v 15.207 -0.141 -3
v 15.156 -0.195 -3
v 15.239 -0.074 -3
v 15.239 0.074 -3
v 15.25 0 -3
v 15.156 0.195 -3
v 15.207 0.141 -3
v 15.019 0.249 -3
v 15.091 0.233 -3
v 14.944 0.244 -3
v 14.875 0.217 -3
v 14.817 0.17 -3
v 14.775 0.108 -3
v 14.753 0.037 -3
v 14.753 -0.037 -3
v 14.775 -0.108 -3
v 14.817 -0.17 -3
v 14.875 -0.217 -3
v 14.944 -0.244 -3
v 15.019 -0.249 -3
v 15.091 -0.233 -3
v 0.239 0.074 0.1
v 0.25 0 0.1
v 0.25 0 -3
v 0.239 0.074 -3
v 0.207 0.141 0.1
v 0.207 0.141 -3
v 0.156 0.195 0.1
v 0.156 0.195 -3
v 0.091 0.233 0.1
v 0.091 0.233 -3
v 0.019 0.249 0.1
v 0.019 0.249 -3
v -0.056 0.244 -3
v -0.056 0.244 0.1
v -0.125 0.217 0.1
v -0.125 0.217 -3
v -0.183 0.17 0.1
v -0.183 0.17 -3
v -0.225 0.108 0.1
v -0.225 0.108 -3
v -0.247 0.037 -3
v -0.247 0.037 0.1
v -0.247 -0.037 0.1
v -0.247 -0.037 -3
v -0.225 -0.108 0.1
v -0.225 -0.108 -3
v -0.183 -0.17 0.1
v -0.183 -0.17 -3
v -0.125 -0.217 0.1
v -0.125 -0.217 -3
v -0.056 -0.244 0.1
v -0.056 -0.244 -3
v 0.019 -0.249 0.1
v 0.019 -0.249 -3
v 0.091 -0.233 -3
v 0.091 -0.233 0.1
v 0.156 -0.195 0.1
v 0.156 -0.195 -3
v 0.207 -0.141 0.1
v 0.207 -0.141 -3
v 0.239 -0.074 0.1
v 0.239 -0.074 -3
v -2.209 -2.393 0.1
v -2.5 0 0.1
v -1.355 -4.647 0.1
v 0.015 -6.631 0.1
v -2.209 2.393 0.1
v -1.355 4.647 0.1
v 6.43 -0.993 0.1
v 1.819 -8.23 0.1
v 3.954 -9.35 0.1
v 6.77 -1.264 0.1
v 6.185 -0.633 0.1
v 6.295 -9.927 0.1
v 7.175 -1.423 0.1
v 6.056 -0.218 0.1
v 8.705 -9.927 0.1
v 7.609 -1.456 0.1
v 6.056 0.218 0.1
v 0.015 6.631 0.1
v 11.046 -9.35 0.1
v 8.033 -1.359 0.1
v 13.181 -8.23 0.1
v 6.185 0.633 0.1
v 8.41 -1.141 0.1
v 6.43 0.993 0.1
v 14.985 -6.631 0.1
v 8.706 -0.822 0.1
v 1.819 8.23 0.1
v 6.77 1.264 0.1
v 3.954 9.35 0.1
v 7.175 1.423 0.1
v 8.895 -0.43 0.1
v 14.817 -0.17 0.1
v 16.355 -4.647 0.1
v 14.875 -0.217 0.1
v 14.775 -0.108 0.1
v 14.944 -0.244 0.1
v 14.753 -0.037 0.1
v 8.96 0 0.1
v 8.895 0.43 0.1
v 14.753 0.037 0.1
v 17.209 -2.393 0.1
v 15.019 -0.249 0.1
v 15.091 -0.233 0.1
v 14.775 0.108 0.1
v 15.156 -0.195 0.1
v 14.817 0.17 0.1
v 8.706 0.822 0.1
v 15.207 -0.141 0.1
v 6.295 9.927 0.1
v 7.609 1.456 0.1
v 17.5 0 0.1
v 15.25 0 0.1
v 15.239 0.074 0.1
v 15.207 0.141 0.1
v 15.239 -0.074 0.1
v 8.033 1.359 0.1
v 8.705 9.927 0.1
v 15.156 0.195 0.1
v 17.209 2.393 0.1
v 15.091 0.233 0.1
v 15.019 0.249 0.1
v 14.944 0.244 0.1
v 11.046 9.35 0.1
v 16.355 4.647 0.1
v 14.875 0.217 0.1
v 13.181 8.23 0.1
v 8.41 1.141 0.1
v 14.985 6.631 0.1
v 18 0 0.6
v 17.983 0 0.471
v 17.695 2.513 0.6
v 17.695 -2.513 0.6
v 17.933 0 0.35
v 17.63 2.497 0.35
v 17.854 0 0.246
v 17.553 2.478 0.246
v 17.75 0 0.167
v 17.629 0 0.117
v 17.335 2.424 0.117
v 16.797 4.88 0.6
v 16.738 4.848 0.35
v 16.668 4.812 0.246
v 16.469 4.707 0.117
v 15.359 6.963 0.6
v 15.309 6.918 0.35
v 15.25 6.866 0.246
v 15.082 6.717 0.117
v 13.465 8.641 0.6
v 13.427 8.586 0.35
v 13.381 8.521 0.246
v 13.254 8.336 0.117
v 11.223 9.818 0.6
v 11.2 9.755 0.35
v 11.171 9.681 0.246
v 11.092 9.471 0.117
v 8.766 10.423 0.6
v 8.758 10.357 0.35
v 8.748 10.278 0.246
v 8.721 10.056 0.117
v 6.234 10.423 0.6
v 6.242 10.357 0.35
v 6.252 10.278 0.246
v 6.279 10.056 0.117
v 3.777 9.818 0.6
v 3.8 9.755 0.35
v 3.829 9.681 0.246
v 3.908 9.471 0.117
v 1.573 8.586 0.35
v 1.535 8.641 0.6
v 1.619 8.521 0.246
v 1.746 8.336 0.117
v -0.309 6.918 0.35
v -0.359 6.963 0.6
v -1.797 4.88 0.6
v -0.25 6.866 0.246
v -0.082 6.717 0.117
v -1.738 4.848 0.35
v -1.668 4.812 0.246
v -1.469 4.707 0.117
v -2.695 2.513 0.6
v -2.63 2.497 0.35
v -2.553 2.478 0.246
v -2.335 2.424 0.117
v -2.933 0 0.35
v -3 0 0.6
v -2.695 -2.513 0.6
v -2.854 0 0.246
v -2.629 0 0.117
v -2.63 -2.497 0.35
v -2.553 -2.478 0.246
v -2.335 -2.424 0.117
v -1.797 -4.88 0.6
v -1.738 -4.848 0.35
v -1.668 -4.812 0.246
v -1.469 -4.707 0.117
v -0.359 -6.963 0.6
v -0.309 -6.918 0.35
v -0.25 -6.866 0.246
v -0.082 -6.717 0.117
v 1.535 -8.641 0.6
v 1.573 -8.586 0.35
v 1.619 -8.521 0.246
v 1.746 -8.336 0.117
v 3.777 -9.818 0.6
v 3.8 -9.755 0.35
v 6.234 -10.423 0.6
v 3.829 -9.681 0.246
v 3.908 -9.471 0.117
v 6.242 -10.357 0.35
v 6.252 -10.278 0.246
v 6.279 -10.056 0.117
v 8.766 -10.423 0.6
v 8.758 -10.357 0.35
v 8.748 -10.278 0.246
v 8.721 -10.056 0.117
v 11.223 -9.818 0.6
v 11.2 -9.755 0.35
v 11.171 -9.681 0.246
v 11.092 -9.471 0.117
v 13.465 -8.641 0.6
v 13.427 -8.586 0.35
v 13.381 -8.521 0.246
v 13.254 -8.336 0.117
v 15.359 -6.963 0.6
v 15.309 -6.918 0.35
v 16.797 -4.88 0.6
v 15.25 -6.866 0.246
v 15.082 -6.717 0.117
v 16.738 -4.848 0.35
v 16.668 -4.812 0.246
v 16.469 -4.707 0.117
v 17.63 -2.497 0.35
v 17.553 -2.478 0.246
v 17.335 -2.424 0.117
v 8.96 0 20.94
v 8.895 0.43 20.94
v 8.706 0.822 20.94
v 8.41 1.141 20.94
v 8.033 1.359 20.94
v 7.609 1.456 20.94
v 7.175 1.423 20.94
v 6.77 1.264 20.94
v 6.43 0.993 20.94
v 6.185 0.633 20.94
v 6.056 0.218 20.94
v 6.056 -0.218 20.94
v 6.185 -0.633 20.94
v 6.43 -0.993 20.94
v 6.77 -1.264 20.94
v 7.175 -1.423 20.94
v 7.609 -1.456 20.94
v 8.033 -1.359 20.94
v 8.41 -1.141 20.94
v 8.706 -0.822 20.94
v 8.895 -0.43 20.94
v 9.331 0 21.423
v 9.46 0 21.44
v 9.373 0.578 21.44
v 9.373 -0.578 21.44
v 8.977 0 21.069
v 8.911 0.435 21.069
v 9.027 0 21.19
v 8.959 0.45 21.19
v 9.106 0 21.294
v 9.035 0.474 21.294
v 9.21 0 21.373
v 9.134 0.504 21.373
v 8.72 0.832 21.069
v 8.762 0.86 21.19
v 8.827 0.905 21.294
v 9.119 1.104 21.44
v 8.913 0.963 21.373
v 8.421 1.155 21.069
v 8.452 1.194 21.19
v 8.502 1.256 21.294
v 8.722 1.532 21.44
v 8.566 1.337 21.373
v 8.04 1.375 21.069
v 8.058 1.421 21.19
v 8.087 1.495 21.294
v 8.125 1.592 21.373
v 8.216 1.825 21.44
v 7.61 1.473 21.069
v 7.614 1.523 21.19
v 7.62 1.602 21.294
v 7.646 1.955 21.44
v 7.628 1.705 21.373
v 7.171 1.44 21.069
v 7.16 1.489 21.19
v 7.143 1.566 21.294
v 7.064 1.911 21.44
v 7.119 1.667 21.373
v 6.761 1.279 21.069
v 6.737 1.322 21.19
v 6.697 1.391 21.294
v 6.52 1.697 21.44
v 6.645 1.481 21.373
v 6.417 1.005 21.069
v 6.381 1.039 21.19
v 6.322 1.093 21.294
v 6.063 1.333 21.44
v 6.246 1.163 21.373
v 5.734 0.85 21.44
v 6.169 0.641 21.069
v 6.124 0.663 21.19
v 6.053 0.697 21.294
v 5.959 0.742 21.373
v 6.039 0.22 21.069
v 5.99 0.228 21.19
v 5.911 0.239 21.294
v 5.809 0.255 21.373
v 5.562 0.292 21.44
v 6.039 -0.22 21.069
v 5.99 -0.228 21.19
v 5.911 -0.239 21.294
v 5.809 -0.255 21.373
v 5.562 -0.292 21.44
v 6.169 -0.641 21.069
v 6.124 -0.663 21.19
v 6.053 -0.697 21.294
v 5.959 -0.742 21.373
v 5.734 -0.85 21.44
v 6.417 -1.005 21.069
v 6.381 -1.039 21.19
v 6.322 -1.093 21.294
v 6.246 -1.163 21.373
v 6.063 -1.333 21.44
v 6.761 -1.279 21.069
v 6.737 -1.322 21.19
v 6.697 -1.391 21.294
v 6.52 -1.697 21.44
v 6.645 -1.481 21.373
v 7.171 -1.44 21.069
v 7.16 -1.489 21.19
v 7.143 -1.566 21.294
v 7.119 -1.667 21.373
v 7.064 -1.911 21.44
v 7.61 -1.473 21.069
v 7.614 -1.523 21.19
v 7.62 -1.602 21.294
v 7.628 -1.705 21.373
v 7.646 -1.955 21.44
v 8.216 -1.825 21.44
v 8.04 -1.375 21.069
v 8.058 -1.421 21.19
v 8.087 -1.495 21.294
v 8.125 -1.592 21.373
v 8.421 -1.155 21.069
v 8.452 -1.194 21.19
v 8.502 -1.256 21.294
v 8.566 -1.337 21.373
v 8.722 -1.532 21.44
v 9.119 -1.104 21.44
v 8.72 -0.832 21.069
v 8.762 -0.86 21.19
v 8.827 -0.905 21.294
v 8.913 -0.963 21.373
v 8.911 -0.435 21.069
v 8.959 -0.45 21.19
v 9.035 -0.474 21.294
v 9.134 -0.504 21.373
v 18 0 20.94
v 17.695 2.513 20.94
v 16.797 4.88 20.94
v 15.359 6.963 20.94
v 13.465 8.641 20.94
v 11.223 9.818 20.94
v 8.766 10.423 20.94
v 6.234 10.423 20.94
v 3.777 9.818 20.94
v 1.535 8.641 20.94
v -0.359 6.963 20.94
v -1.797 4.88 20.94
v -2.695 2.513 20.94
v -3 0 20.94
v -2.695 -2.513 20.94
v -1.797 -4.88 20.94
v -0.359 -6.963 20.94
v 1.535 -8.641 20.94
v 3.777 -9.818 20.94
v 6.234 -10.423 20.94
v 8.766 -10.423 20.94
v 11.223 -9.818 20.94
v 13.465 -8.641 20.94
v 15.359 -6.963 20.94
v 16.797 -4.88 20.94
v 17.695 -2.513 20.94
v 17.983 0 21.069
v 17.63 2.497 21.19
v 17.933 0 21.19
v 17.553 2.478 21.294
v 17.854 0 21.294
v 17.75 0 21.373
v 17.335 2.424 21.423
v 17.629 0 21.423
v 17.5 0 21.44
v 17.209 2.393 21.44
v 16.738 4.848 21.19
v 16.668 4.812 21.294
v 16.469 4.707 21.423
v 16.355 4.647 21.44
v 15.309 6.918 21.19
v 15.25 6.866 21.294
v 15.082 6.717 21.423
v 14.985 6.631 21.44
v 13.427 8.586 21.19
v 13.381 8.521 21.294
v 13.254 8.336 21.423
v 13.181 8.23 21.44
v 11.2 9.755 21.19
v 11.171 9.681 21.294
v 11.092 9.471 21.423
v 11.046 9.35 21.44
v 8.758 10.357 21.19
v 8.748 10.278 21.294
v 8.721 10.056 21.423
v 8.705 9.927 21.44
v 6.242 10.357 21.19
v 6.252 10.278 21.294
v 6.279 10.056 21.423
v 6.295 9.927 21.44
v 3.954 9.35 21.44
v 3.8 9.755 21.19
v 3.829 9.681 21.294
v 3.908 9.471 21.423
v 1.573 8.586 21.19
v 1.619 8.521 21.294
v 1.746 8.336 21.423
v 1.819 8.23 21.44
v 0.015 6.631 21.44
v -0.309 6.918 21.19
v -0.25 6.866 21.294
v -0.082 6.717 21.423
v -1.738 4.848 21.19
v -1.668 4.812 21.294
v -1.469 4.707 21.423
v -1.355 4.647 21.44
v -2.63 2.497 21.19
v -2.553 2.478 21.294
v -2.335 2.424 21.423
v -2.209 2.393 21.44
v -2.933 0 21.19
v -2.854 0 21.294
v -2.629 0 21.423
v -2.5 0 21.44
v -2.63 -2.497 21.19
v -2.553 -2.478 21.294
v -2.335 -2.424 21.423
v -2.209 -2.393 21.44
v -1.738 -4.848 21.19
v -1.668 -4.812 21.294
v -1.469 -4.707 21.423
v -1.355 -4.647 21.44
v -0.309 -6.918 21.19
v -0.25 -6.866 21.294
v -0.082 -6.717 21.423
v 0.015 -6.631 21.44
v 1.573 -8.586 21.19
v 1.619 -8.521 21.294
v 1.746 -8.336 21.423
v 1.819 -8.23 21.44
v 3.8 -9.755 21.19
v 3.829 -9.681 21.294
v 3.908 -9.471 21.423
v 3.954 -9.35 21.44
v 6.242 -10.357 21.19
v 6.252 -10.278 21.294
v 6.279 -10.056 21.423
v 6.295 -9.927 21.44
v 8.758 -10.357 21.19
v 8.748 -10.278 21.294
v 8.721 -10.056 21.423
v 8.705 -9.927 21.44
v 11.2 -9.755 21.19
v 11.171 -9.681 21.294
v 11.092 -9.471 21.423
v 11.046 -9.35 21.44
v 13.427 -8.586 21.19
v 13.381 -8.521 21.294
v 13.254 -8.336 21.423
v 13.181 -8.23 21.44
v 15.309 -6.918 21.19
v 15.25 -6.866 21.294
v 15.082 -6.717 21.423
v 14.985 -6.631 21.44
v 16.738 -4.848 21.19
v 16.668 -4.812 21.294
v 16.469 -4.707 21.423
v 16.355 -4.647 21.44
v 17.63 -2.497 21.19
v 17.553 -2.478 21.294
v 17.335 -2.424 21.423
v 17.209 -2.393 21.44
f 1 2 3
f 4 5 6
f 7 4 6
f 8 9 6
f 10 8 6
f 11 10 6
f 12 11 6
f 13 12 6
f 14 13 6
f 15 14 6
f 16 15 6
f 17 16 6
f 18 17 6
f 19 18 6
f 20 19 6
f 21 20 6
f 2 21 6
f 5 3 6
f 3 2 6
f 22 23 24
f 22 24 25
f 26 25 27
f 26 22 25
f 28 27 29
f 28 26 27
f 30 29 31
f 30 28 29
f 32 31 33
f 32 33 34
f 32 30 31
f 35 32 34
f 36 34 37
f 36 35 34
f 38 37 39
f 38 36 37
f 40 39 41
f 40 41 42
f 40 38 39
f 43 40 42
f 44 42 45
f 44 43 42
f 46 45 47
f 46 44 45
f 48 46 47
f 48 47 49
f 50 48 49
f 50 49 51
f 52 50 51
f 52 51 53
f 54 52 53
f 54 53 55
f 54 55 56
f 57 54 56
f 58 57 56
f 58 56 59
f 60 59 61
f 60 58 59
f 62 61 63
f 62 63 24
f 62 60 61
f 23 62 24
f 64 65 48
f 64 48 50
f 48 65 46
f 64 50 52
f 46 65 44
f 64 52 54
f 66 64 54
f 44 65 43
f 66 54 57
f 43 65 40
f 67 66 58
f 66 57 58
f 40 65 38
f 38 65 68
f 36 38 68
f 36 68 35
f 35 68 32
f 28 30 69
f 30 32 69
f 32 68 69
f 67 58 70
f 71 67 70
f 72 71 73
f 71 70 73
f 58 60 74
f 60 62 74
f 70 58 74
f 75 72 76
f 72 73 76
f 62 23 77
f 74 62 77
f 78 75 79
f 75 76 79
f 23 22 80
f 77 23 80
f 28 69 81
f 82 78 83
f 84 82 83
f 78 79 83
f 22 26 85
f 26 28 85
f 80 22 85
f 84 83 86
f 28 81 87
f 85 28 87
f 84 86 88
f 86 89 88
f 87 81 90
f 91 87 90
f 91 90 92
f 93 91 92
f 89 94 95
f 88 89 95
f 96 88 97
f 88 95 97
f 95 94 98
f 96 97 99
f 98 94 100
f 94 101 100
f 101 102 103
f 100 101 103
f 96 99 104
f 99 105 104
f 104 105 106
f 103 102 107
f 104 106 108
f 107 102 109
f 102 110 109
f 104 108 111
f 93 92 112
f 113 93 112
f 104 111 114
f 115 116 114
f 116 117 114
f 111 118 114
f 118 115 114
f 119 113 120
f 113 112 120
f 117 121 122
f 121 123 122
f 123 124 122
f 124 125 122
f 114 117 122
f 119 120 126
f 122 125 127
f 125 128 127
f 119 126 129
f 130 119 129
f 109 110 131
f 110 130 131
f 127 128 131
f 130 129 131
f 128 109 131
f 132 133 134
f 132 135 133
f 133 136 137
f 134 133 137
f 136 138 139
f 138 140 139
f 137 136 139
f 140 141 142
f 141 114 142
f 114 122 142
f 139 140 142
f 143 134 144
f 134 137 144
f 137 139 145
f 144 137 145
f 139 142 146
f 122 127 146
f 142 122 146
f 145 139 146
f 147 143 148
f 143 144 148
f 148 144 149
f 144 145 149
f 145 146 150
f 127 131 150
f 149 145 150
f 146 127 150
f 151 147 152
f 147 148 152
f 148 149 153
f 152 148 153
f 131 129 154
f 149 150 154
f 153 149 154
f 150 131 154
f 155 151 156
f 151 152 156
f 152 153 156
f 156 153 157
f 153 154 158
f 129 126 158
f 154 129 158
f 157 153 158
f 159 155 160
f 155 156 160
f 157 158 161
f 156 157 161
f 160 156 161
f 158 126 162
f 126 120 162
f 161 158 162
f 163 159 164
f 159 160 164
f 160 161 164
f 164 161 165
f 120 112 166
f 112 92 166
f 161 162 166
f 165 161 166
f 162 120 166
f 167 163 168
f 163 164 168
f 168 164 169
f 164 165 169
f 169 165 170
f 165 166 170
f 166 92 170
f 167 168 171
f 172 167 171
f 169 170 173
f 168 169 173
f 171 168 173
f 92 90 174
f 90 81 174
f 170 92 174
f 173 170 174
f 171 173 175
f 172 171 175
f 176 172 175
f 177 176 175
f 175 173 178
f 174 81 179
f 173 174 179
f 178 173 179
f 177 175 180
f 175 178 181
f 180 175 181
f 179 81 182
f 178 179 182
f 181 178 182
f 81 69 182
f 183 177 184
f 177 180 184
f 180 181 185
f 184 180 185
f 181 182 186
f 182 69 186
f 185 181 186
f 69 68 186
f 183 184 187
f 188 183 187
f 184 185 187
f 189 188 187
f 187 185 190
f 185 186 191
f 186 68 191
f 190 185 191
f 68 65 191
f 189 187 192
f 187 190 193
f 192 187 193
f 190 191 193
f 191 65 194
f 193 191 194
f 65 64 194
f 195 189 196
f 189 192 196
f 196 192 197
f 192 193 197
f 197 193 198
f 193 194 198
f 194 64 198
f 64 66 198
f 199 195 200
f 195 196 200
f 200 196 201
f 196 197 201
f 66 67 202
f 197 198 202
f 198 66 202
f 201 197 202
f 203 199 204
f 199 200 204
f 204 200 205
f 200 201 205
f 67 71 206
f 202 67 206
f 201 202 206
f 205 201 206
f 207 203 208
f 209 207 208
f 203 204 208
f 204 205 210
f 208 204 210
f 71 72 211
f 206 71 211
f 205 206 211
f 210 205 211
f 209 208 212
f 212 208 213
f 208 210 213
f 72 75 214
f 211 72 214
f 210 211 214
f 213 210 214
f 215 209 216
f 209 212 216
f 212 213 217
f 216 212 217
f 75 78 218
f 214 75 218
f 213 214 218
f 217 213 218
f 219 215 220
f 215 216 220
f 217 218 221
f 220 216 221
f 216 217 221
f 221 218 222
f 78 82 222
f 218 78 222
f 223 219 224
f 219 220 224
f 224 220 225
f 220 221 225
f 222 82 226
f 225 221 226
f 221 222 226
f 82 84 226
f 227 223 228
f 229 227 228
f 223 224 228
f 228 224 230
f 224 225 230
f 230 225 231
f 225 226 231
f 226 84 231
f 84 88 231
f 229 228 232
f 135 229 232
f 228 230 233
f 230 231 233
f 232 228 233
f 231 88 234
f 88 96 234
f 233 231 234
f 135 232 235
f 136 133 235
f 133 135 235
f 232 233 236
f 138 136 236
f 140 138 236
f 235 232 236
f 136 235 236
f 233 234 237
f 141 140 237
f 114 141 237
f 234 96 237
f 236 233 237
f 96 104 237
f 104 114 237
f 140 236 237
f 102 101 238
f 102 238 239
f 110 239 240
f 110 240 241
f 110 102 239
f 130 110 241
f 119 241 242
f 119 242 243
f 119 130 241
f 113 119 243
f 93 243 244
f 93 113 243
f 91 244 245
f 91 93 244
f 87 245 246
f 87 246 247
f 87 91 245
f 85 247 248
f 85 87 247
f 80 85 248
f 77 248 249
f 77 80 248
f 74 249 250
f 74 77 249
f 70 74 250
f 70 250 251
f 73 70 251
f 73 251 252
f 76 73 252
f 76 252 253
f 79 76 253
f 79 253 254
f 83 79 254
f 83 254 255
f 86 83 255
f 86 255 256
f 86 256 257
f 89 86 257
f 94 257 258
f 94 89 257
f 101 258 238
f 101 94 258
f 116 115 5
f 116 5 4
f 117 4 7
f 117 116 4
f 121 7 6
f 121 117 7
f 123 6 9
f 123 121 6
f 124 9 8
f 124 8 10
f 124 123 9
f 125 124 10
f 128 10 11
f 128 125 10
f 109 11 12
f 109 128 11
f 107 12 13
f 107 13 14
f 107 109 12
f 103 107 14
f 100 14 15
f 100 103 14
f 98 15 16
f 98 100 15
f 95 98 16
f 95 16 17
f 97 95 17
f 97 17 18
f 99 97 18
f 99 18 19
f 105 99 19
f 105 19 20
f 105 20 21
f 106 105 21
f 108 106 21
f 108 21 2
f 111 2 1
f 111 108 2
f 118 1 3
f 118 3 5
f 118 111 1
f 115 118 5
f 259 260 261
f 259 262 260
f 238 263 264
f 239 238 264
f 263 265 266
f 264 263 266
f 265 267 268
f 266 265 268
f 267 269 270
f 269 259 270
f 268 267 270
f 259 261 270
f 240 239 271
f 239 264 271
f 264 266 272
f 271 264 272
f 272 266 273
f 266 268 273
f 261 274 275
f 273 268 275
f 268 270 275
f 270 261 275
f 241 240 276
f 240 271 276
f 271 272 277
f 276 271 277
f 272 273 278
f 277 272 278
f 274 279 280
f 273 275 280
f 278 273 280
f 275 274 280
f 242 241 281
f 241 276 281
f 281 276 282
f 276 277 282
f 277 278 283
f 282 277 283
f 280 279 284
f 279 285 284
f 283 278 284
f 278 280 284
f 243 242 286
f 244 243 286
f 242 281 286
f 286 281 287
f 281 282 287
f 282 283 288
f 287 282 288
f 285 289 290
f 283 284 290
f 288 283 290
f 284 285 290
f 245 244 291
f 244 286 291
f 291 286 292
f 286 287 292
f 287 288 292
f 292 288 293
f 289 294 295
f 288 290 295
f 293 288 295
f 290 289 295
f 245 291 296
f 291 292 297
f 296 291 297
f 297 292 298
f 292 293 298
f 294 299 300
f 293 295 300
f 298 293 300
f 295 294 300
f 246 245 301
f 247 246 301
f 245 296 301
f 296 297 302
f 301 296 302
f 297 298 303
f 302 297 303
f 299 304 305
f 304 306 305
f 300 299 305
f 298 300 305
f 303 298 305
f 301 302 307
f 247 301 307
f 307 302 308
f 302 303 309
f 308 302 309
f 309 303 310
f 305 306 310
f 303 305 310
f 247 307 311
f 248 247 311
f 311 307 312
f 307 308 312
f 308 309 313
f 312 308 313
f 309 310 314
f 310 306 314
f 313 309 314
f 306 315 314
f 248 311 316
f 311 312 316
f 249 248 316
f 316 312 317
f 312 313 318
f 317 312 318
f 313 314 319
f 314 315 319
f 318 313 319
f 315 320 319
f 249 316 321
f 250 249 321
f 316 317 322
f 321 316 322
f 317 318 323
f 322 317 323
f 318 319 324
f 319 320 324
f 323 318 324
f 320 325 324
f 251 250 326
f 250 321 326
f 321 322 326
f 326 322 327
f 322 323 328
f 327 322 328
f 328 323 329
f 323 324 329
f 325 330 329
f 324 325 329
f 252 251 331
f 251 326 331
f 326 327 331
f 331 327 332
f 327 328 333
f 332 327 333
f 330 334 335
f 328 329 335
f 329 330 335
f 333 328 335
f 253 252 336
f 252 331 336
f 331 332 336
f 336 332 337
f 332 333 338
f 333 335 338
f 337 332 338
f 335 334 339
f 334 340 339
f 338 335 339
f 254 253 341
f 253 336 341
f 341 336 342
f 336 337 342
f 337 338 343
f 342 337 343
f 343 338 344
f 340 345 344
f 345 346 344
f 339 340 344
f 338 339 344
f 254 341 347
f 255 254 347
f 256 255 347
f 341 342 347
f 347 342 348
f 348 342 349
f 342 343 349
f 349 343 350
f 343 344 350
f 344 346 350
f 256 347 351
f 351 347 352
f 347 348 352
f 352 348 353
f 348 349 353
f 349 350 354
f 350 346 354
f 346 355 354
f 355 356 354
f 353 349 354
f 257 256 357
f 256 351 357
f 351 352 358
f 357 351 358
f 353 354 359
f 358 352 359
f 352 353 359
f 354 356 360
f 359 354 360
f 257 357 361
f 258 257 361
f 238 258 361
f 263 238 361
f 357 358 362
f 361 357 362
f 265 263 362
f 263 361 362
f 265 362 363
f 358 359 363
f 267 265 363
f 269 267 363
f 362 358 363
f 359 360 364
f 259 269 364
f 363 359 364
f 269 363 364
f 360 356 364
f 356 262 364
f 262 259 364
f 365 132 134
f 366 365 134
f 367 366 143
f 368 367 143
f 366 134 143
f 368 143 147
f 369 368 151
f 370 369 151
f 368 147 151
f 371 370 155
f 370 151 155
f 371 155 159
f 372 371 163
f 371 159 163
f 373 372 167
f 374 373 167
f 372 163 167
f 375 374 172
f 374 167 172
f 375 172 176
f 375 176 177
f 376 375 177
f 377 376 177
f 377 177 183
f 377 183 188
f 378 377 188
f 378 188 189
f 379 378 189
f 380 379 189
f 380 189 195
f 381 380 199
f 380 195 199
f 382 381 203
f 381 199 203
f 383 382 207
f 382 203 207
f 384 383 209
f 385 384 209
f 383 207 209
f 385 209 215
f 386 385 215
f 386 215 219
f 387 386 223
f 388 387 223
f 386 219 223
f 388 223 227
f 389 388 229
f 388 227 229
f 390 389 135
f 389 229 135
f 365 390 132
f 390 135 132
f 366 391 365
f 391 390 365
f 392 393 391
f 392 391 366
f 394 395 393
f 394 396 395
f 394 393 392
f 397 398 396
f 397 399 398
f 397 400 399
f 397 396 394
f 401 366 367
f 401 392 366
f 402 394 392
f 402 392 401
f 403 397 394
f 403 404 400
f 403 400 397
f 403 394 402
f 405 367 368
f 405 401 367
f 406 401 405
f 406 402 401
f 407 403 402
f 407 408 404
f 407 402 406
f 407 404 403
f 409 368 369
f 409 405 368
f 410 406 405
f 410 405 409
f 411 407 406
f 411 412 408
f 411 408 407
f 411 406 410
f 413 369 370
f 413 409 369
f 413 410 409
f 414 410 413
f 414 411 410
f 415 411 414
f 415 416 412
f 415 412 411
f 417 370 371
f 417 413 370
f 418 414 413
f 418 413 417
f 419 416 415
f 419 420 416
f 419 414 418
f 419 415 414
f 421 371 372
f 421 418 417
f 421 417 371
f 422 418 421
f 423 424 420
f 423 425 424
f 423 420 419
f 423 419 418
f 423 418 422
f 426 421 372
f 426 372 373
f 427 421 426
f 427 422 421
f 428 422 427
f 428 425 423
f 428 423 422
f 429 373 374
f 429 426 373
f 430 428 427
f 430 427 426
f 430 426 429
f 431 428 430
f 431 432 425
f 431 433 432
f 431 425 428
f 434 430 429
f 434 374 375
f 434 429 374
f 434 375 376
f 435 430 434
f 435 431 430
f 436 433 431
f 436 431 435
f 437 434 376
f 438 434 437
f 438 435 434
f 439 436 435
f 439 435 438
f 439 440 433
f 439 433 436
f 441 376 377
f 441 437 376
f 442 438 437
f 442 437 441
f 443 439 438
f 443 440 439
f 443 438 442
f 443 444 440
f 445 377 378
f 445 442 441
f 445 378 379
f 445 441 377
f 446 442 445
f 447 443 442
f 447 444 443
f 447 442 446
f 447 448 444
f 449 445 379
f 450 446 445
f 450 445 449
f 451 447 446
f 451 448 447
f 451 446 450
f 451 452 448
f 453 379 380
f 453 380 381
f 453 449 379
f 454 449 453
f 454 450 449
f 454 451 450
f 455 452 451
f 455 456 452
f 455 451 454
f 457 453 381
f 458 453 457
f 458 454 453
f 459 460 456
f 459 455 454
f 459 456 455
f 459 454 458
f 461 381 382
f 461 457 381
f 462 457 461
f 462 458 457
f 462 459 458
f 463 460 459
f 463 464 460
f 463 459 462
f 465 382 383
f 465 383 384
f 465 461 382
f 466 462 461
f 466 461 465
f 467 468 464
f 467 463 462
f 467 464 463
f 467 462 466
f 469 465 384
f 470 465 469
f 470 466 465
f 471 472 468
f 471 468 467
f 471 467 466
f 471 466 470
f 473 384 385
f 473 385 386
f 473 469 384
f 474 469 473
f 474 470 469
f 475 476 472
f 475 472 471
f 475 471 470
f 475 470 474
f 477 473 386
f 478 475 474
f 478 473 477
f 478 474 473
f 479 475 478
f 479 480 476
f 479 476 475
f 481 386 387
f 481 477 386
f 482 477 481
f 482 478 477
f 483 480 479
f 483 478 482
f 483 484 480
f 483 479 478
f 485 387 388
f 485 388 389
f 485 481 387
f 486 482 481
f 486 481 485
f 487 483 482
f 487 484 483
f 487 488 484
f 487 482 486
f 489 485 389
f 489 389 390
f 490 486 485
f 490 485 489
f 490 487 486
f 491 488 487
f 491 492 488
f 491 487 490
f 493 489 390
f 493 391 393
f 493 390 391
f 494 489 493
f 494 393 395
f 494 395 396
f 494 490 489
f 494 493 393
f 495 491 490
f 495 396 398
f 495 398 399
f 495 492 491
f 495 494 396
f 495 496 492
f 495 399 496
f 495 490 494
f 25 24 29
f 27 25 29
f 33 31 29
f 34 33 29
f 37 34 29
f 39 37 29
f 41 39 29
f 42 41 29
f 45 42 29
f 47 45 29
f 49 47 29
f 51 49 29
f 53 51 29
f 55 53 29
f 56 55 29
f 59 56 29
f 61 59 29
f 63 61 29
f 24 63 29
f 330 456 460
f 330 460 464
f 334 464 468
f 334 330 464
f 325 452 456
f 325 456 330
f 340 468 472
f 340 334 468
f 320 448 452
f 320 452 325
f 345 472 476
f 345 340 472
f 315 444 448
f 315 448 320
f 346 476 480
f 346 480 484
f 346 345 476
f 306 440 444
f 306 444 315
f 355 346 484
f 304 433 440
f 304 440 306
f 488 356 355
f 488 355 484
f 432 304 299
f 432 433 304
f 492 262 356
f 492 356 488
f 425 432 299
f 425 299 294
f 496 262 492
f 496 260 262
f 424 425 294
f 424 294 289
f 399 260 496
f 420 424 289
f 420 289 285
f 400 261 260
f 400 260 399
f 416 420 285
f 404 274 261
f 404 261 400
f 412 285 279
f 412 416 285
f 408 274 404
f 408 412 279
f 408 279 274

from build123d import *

# Parameters (mm, degrees)
SKETCH001_R       = 0.25
PAD001_DEPTH      = 10.67
PAD001_DEPTH_BACK = 3.5
SKETCH_R          = 10.5
SKETCH_R_2        = 1.46
PAD_DEPTH         = 21.34
FILLET_R          = 0.5


with BuildPart() as pad001:
    # Sketch001 → Pad001 (new body, two sides)
    with BuildSketch(Plane.XY.offset(0.5)) as pad001_sk:
        Circle(SKETCH001_R)
        with Locations((15, 0)):
            Circle(SKETCH001_R)
    extrude(amount=PAD001_DEPTH)
    extrude(pad001_sk.sketch, amount=-PAD001_DEPTH_BACK)


with BuildPart() as fillet_mp_cp:
    # Sketch → Pad (new body)
    with BuildSketch(Plane.XY.offset(0.1)):
        with Locations((7.5, 0)):
            Circle(SKETCH_R)
        with Locations((7.5, 0)):
            Circle(SKETCH_R_2, mode=Mode.SUBTRACT)
    extrude(amount=PAD_DEPTH)

    # Fillet
    fillet_edges = [fillet_mp_cp.edges().sort_by_distance(p)[0] for p in [
        (6.04, 0, 21.44),
        (-3, 0, 21.44),
        (-3, 0, 0.1),
    ]]
    fillet(fillet_edges, radius=FILLET_R)

    # Fillet_mp_cp: union Pad001
    add(pad001.part)


solid = fillet_mp_cp.part
